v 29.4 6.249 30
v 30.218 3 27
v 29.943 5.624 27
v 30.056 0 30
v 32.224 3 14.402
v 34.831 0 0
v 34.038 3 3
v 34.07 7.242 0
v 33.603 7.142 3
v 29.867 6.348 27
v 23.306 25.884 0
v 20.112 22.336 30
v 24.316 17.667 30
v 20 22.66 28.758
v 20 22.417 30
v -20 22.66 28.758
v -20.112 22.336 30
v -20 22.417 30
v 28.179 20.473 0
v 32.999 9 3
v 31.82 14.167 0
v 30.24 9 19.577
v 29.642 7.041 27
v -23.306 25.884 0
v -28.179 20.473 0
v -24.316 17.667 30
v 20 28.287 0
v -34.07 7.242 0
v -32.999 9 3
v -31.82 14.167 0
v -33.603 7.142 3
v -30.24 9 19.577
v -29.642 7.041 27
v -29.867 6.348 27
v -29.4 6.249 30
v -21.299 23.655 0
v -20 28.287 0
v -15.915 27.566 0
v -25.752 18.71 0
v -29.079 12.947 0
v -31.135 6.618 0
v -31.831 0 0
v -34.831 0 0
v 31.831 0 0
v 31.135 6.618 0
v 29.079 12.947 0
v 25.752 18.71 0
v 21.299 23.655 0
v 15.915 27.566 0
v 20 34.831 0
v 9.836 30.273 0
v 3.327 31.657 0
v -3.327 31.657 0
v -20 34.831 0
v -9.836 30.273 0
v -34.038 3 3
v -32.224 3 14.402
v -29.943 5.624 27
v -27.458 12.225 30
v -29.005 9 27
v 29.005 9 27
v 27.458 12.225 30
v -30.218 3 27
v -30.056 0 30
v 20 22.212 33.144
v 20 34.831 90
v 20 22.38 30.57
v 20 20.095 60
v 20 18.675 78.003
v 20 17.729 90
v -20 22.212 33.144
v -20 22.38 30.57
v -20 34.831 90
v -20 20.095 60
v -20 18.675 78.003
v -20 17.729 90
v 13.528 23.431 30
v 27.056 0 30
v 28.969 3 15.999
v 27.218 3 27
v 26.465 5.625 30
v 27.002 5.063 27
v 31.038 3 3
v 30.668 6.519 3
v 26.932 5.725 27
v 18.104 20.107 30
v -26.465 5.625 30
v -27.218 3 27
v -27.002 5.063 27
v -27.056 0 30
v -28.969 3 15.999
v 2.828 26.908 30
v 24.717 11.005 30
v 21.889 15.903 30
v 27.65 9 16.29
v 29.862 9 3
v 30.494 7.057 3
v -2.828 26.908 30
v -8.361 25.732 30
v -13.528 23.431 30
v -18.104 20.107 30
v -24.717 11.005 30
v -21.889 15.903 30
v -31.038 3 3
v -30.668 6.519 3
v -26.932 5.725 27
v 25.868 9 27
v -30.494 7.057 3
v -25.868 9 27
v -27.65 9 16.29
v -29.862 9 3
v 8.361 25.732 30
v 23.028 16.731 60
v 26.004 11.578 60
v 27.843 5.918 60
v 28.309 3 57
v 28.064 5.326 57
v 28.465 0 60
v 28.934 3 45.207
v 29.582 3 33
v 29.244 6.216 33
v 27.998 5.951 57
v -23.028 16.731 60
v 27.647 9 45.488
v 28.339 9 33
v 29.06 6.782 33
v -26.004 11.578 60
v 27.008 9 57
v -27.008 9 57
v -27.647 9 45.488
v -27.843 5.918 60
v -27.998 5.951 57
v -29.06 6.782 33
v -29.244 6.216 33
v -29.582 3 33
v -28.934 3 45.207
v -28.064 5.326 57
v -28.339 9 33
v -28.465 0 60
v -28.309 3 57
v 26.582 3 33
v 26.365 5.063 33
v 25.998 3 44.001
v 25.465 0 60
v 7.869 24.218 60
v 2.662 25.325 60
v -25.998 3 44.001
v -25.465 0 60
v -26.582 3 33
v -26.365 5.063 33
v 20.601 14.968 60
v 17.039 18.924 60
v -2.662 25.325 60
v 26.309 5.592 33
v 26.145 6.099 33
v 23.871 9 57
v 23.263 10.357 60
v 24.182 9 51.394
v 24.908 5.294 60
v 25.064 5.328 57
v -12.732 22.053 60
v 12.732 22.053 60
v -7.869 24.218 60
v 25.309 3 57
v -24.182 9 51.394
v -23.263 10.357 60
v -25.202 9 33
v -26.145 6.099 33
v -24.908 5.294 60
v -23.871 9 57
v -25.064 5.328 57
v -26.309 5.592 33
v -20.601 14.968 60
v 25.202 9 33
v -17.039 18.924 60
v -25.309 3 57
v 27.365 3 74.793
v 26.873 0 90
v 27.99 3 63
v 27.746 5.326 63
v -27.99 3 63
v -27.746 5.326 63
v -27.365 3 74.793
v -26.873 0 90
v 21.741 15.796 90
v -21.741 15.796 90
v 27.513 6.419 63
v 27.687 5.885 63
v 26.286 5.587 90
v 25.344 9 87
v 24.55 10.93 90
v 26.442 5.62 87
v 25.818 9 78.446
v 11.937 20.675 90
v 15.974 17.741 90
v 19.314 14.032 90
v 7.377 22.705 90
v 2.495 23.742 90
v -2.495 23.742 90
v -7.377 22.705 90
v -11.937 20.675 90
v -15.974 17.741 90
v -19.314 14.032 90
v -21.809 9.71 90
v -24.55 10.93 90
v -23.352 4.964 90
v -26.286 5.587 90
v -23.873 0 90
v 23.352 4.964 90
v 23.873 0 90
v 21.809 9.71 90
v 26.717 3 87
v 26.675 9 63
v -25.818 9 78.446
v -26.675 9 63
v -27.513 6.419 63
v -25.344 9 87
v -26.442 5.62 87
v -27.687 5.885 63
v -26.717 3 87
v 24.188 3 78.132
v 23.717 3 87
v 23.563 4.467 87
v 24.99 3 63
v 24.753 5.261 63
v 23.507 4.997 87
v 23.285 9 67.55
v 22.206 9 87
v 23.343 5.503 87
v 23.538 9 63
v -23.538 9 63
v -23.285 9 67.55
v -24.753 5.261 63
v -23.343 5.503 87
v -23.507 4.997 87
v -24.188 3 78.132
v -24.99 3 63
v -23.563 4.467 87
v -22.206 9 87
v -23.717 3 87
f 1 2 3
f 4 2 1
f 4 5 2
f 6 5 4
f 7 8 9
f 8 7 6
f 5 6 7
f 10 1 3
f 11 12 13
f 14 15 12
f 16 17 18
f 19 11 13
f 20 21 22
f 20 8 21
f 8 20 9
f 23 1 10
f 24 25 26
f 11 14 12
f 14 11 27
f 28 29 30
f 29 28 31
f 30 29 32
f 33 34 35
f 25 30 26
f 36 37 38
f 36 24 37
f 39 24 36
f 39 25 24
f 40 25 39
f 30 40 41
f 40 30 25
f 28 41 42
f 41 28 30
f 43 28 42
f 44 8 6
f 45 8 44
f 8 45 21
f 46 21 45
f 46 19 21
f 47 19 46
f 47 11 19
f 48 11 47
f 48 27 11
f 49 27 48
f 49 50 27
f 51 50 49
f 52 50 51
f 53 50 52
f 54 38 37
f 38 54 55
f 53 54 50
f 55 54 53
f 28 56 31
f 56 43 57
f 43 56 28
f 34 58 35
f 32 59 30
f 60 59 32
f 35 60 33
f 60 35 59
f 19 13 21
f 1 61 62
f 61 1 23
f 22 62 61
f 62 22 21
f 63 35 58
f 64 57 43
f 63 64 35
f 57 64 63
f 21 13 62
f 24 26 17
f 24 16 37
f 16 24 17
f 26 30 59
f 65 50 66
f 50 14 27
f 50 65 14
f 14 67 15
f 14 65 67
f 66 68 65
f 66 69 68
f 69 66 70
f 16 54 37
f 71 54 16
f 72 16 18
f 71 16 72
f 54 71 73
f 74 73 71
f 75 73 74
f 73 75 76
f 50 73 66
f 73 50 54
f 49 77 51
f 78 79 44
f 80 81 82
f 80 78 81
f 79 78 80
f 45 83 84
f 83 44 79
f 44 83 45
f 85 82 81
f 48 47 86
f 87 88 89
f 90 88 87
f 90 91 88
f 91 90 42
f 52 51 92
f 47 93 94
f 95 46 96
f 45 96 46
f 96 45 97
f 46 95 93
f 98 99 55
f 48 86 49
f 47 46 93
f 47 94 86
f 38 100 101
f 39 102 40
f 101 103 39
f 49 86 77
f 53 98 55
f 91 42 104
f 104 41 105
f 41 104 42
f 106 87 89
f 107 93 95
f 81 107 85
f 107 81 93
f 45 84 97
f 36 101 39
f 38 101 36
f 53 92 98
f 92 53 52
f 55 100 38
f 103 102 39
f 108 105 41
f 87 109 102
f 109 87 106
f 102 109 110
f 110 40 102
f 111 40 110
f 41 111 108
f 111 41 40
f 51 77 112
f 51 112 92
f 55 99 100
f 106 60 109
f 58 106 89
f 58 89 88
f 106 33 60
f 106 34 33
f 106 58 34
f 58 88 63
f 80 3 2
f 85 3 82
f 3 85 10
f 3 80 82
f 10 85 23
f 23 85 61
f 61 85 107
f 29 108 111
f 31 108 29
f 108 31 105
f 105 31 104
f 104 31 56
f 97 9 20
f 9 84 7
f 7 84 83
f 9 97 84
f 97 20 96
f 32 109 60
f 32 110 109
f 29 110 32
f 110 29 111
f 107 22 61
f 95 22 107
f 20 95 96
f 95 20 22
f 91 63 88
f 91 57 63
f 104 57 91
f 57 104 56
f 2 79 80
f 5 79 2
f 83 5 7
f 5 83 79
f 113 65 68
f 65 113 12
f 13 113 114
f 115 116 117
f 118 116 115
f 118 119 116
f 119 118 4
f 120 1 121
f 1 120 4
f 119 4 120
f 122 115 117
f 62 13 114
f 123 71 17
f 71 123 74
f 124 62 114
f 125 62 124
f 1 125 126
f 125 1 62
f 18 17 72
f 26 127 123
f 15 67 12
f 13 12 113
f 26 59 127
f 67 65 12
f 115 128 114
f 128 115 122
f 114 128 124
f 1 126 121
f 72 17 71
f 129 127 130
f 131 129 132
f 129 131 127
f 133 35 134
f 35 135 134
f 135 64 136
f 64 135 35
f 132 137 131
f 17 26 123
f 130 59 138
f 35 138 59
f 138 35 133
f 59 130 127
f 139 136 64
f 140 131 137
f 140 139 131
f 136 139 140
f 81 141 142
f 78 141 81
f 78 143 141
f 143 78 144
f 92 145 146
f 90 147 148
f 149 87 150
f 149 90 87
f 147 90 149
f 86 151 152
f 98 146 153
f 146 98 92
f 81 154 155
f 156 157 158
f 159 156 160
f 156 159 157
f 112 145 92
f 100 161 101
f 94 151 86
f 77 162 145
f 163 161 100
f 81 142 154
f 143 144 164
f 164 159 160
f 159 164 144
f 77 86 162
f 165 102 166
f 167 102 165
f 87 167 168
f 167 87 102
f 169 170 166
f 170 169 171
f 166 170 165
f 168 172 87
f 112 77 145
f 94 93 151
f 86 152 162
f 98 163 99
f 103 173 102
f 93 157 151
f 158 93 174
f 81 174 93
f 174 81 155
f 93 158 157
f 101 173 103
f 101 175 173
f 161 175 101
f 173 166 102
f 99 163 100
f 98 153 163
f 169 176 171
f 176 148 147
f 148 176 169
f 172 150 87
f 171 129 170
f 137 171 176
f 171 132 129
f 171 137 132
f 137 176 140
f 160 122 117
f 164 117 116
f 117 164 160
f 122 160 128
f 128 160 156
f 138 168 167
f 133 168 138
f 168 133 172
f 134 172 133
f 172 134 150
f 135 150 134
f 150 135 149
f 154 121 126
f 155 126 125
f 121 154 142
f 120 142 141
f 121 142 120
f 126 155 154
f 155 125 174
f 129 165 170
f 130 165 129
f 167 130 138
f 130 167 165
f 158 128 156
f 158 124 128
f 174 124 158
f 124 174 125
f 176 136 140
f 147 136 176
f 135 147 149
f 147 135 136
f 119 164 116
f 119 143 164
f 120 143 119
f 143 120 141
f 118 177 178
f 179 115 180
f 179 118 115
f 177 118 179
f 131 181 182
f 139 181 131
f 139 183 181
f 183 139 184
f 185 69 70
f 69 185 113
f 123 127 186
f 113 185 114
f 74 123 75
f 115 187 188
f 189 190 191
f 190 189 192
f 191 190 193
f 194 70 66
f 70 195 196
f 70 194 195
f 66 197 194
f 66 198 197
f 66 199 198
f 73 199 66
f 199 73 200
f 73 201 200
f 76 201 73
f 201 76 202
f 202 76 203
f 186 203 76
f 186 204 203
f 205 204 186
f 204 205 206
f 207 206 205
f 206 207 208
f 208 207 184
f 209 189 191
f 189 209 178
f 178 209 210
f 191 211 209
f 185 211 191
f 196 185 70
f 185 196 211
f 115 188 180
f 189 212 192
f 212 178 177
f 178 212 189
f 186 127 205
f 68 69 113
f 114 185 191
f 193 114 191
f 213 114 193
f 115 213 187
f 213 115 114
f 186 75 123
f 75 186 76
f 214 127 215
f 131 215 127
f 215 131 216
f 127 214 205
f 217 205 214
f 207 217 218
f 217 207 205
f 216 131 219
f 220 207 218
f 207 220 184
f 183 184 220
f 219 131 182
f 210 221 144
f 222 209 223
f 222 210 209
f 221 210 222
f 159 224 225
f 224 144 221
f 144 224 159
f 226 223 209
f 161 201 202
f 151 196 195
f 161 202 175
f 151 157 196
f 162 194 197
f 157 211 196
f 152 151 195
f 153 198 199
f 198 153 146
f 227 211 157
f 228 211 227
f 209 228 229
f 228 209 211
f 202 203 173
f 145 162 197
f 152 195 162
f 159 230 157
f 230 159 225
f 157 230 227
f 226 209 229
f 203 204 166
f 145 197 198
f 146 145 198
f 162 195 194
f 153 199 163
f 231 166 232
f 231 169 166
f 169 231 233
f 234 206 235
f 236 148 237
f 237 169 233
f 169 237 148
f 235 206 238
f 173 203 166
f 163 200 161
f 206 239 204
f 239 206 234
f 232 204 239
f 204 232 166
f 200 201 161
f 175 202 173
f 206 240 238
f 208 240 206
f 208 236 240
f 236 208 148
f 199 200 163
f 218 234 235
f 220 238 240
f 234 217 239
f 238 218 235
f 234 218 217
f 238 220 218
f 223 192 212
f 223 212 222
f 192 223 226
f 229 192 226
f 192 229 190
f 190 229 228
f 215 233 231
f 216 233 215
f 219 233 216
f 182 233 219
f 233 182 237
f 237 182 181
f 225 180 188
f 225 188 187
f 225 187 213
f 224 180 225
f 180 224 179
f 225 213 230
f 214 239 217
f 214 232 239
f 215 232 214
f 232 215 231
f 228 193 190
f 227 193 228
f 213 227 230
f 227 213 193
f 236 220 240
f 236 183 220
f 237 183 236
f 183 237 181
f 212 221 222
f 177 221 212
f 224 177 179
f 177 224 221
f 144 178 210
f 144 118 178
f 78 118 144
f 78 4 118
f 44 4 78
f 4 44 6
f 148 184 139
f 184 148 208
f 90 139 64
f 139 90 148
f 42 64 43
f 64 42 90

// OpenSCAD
difference()  {
union()  {
translate([0.0,0.0,0.0])  difference()  {
union()  {
cylinder(r1=34.83099,r2=30.056341,h=30.0);
translate([-20.0,0.0,0.0])  cube([40.0,34.830986,30.0]);
}
cylinder(r1=31.830988,r2=27.056341,h=30.0);
translate([-34.830986,3.0,3.0])  cube([69.66197,6.0,24.0]);
}
translate([0.0,0.0,30.0])  difference()  {
union()  {
cylinder(r1=30.056341,r2=28.46479,h=30.0);
translate([-20.0,0.0,0.0])  cube([40.0,34.830986,30.0]);
}
cylinder(r1=27.056341,r2=25.46479,h=30.0);
translate([-34.830986,3.0,3.0])  cube([69.66197,6.0,24.0]);
}
translate([0.0,0.0,60.0])  difference()  {
union()  {
cylinder(r1=28.46479,r2=26.873241,h=30.0);
translate([-20.0,0.0,0.0])  cube([40.0,34.830986,30.0]);
}
cylinder(r1=25.46479,r2=23.873241,h=30.0);
translate([-34.830986,3.0,3.0])  cube([69.66197,6.0,24.0]);
}
}
translate([-34.830986,-34.830986,0.0])  cube([69.66197,34.830986,120.0]);
}
